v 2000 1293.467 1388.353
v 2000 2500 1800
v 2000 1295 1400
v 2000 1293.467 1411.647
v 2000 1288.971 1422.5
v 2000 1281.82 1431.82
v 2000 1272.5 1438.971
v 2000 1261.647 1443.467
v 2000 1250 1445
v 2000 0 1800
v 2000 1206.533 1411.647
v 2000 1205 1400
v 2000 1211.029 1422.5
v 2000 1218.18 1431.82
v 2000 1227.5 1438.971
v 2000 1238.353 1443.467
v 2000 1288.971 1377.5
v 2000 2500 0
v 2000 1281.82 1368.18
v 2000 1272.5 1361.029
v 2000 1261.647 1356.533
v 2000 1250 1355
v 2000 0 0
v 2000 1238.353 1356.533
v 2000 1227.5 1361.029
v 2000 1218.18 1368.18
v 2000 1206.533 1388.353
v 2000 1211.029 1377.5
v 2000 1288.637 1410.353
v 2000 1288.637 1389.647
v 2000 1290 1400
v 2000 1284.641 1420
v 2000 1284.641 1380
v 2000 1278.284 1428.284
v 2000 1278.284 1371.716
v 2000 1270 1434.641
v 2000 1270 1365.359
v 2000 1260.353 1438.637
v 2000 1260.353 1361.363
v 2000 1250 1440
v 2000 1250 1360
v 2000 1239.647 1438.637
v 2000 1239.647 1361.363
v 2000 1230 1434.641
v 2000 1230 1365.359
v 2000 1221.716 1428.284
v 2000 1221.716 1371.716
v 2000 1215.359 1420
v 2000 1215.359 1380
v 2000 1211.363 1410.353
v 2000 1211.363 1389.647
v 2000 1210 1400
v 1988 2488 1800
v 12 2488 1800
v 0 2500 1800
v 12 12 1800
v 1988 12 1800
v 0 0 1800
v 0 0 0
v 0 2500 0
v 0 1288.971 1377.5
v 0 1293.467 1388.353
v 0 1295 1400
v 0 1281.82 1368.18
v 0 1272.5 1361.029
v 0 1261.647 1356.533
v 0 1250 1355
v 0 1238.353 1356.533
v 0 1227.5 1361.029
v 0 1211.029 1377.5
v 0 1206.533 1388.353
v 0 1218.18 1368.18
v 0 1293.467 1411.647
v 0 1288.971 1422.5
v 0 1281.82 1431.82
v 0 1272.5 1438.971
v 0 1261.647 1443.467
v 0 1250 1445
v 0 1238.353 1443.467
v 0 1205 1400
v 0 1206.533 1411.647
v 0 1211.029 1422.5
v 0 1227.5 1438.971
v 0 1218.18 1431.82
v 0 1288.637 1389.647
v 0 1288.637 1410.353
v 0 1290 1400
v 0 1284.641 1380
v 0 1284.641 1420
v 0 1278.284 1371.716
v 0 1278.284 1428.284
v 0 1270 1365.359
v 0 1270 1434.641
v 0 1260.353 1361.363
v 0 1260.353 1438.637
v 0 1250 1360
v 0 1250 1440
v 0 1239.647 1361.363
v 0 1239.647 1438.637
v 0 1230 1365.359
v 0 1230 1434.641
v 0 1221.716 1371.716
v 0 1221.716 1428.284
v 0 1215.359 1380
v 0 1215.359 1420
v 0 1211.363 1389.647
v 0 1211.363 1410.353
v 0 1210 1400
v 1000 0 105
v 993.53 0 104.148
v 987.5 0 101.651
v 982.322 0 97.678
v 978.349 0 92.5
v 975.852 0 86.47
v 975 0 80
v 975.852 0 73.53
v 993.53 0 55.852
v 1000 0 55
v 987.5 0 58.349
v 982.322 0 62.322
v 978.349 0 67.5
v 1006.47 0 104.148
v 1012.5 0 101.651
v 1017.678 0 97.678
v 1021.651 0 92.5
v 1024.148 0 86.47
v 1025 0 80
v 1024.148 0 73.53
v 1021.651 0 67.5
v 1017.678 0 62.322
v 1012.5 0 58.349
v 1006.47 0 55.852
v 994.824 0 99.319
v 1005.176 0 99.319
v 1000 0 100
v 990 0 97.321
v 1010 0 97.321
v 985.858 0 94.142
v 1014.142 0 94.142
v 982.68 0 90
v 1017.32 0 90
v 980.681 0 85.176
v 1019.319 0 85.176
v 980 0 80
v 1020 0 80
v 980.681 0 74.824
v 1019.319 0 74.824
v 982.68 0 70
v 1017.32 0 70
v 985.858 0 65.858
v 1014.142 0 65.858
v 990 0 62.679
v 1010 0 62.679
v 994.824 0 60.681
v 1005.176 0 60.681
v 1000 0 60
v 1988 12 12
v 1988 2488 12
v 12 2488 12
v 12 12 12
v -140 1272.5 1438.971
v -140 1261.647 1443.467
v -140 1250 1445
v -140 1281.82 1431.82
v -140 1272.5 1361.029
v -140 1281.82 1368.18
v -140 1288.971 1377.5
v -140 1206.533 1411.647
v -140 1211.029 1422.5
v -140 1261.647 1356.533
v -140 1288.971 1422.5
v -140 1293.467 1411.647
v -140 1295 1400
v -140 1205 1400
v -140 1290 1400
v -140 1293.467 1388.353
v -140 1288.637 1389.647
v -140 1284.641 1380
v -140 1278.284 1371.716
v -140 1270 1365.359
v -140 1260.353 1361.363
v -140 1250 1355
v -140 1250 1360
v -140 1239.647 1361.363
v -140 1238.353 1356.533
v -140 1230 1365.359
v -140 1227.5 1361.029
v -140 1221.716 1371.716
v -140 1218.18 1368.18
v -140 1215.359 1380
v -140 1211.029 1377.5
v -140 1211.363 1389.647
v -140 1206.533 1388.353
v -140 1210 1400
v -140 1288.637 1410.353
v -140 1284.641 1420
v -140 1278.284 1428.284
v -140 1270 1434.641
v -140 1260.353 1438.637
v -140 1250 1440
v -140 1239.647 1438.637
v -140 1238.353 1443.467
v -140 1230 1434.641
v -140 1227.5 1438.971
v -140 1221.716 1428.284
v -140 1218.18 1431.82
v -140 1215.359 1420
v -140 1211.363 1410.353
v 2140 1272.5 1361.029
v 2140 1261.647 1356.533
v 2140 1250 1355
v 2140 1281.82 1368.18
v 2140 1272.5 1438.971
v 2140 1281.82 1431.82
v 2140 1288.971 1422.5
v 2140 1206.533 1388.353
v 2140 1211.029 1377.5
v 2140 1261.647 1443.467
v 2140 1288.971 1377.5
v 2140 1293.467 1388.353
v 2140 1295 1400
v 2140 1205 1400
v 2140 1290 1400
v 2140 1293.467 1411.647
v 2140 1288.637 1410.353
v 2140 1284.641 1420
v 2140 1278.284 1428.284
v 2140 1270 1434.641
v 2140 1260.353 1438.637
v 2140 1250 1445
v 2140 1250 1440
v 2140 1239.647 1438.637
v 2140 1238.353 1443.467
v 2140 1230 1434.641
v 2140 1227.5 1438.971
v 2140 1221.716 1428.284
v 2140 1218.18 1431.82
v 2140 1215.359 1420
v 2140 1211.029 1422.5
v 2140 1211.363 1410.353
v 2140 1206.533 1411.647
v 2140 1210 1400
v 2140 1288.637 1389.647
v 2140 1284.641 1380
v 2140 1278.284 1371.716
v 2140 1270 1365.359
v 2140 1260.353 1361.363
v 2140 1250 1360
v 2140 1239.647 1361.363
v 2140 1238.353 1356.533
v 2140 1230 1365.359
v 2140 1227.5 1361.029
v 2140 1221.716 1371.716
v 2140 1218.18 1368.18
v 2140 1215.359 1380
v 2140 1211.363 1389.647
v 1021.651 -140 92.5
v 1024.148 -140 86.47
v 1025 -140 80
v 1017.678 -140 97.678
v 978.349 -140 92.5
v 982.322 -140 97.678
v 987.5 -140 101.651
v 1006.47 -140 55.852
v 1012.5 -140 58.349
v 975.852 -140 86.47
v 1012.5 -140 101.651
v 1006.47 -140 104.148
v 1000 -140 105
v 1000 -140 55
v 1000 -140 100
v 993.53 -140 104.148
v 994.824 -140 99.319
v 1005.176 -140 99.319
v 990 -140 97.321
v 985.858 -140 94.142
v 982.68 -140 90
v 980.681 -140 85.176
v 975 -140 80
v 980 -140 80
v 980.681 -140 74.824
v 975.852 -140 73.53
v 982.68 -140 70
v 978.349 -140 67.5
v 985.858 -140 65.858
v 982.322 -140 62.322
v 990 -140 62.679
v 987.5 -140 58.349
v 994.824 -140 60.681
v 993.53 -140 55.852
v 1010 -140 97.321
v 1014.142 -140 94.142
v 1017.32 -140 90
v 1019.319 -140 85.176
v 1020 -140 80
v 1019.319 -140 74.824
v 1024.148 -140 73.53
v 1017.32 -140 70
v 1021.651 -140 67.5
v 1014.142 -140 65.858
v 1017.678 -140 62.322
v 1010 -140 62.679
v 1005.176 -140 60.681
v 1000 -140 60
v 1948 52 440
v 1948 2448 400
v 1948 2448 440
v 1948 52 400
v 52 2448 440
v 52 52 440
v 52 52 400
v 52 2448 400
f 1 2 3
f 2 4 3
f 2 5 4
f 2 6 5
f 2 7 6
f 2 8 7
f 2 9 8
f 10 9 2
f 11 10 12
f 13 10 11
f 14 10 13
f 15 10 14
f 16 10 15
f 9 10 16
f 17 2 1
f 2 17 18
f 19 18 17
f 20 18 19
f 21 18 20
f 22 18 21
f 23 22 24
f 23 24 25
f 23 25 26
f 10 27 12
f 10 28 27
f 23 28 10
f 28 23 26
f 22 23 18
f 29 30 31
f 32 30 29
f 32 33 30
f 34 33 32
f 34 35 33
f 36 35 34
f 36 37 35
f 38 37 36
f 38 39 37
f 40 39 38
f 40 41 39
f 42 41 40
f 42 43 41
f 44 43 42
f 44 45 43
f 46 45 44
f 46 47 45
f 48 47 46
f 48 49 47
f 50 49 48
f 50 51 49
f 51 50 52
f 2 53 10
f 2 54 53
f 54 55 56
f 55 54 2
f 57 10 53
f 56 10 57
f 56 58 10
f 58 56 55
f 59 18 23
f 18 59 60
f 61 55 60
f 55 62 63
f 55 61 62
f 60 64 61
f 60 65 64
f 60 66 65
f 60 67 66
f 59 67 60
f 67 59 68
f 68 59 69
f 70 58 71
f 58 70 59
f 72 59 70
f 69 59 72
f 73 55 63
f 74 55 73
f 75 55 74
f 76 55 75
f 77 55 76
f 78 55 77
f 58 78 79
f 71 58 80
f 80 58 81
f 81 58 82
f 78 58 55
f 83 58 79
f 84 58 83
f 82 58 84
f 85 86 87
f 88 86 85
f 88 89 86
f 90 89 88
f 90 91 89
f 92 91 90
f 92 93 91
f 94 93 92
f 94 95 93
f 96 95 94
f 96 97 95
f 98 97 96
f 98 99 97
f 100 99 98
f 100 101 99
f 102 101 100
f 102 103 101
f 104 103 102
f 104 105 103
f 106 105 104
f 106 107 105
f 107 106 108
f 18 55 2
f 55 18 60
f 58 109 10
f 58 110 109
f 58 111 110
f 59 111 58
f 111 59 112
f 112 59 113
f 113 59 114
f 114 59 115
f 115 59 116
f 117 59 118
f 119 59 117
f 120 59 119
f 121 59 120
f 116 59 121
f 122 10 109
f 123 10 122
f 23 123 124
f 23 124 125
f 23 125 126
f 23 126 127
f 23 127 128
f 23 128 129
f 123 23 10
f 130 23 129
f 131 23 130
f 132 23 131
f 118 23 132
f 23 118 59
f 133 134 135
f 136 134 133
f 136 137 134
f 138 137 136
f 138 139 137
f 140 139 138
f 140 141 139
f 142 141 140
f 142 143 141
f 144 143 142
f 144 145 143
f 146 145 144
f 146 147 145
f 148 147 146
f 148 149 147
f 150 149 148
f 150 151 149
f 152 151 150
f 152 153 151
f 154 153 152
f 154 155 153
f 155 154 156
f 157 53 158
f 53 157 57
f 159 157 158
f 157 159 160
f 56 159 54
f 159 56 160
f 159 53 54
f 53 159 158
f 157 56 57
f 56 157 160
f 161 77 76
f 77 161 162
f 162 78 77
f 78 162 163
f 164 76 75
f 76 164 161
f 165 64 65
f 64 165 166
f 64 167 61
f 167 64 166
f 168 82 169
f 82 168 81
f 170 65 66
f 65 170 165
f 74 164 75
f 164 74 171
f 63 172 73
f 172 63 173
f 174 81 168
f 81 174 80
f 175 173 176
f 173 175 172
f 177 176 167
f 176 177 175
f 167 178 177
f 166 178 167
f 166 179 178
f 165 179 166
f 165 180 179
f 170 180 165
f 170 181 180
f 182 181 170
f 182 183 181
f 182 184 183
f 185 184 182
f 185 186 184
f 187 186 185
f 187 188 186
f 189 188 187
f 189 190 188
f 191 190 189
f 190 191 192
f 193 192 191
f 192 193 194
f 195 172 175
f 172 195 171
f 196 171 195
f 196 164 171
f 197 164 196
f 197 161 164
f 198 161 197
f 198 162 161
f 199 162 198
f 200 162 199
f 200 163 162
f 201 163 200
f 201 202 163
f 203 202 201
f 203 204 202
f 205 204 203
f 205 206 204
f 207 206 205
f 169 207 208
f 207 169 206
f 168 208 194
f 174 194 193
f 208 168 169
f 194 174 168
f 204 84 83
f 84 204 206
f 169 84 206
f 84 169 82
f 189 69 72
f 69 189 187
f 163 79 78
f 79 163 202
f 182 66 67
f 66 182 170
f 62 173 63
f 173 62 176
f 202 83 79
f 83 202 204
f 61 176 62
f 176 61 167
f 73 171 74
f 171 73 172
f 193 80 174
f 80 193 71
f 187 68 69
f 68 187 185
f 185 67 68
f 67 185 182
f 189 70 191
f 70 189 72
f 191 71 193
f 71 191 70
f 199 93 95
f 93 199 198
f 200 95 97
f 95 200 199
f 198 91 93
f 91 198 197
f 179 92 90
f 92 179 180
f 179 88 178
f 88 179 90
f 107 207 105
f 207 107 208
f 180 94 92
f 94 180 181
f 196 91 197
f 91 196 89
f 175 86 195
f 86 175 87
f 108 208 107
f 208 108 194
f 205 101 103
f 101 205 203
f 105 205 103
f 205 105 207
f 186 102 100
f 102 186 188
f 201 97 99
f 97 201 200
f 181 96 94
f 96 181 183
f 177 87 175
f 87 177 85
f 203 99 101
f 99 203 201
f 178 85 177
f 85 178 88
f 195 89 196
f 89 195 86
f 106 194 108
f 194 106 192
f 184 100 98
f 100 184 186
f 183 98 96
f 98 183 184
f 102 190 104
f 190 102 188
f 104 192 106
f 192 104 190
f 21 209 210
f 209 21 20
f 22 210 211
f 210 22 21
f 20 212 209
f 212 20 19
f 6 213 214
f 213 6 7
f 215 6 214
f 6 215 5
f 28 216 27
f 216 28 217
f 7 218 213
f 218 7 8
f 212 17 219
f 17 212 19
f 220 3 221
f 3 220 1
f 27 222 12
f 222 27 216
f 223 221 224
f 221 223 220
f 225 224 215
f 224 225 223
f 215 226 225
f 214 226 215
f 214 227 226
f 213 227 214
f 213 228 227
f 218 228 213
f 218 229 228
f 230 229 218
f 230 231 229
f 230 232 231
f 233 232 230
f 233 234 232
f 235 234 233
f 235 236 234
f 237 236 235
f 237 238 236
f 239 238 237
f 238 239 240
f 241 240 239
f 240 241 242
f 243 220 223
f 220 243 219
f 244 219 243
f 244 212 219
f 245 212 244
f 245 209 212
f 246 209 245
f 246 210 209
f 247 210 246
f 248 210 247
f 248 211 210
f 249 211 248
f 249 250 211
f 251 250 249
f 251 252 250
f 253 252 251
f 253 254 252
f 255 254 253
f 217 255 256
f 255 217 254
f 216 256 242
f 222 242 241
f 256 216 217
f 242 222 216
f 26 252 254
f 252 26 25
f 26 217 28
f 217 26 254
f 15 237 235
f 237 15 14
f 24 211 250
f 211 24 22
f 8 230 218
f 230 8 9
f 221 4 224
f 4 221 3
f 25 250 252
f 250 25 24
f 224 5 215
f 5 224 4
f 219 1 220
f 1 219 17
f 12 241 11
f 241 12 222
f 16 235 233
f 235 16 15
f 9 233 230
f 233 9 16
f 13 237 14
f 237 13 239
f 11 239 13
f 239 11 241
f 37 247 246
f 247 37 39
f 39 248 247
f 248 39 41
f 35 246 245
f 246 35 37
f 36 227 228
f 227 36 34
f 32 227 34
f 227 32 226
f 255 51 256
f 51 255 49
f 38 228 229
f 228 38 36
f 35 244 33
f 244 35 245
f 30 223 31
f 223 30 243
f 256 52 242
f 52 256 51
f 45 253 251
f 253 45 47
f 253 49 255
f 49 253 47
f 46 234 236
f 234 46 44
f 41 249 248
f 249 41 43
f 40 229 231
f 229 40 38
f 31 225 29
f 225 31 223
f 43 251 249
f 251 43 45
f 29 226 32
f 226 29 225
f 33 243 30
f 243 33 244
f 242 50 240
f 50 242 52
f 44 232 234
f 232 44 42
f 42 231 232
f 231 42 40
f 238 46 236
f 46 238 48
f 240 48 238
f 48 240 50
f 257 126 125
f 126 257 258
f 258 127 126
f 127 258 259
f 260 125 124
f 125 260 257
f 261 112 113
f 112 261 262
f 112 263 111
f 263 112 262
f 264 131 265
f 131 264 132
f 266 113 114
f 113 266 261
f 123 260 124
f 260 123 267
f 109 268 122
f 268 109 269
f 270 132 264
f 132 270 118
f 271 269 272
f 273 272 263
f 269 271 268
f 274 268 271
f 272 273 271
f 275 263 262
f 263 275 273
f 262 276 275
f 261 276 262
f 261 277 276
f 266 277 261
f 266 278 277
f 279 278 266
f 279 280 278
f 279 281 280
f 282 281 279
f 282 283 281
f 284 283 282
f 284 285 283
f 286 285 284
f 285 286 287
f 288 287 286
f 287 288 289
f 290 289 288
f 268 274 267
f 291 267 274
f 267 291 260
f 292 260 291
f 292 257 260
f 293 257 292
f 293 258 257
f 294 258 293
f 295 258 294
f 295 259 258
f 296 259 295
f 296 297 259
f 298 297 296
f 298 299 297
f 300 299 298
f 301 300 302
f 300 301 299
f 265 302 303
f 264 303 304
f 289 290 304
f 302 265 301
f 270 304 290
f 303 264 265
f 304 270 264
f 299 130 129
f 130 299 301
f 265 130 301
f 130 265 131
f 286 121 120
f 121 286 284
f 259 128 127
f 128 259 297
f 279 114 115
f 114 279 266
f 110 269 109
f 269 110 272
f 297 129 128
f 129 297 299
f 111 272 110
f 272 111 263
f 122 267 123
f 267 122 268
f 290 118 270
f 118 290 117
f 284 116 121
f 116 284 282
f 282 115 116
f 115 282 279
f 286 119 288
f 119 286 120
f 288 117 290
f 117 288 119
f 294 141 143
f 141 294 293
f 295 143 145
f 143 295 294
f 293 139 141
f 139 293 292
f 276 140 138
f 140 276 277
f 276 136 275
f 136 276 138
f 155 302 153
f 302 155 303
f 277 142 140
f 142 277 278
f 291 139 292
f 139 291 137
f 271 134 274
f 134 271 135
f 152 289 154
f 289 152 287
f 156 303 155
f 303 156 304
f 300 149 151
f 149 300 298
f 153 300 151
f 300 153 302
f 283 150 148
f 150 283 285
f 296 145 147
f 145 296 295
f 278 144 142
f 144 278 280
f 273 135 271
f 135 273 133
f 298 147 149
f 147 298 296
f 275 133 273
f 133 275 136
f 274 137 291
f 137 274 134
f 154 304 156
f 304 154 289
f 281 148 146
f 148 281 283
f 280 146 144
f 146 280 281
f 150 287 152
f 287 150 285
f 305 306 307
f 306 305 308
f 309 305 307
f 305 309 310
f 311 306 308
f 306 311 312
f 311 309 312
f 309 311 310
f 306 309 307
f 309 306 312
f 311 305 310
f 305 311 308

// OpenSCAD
// file: ../params.scad
// Shared millimetre parameters. Keep in lockstep with freecad/params.py.
// Module scale: 150 kg/day wet train. Walls are CPVC sheet, not metal.

$fn = 36;

WALL        = 12;     // CPVC sheet thickness
FLOOR       = 16;     // floor plate (trough sits on this)

// LEACH CSTR 1 — inside liquor box
CSTR_L      = 2000;
CSTR_W      = 1200;
CSTR_H      = 1400;   // liquid + freeboard
FREEBOARD   = 200;

// CSTR 2 weir (same vessel, +X wall)
WEIR_W      = 450;
WEIR_CREST  = CSTR_H - FREEBOARD;   // from inner floor
WEIR_SLOT_H = 80;
WEIR_LIP    = 120;    // external spout projection

// CSTR 3 floor auger — injection-molded PVC / FG
AUGER_D     = 140;    // flight OD
AUGER_SHAFT = 40;
AUGER_PITCH = 110;
AUGER_TROUGH_W = 180;
AUGER_TROUGH_H = 110;
AUGER_OFFSET_Y = 280; // trough centreline from inner -Y wall
AUGER_INCLINE  = 28;  // deg, lifts out of liquor toward +X

// mixer / nozzles (lid)
MIXER_D     = 50;
GAS_D       = 80;     // acid-gas takeoff
DROP_X      = 80;     // inner-X of shred drop slot
DROP_L      = 400;
DROP_W      = 250;
DROP_COAM   = 80;     // raised coaming around the slot

// LEACHATE PUMP / coarse strainer — −X wall, opposite the weir
PUMP_D      = 80;     // DN80
PUMP_Z      = 450;    // centreline above inner floor (submerged)
PUMP_Y      = 900;    // centreline from inner −Y (away from auger)
STRAINER_L  = 180;
STRAINER_W  = 140;
STRAINER_H  = 160;

// mezzanine feed train
MEZZ_H      = 2200;   // platform top above tank outer floor
MEZZ_L      = 1600;   // platform length in −X
MEZZ_THK    = 12;
HOPPER_L    = 700;
HOPPER_W    = 600;
HOPPER_H    = 800;
SHRED_L     = 500;
SHRED_W     = 500;
SHRED_H     = 450;
CONV_W      = 240;
CONV_H      = 120;
CONV_PLATE  = 6;      // trough plate
CONV_FLANGE = 40;
CONV_SPRING_D = 50;
CONV_SPRING_H = 80;
CONV_BOLT   = 10;     // M10 clearance
CONV_LEN    = 1800;   // default standalone length; plant instance is computed
DUST_D      = 150;    // dust-hood outlet to DUST header
AUGER_LIFT_L = 700;

// dewater belts + split (Phase A 4–6)
FDEW_L      = 1800;
FDEW_W      = 450;
FDEW_H      = 80;
FDEW_RISE   = 120;    // solids end higher so liquor runs back to weir
SDEW_L      = 1400;
SDEW_W      = 220;
SDEW_H      = 80;
SPLIT_L     = 600;
SPLIT_W     = 500;
SPLIT_H     = 400;
STUB_L      = 400;
STUB_W      = 300;
STUB_H      = 250;

// EW funnel cell
EW_L        = 600;    // along aisle (overflow direction)
EW_W        = 420;    // anode-cathode depth
EW_H        = 650;    // rectangular body
EW_FUNNEL_H = 220;
EW_VALVE_D  = 50;
EW_VALVE_L  = 60;
EW_MEM_T    = 4;      // CEM
EW_SLOT     = 10;     // membrane cassette slot
EW_PITCH    = 750;    // aisle spacing, centre to centre
AISLE_X0    = 200;
AISLE_Y     = -(EW_W + 2*WALL) - 400;
AISLE_Z     = 400;
BUND_H      = 150;
BUND_PAD    = 250;
SUMP_L      = 400;
SUMP_W      = 400;
SUMP_H      = 300;
VDF_D       = 700;
VDF_L       = 900;
PAIL_W      = 180;
HDR_D       = 80;
HDR_Z       = 1400;
PYRO_D      = 320;
PYRO_L      = 2800;

// Campus envelopes — lockstep with freecad/params.py
FARM_X=12000; FARM_Y=8000; FARM_L=12000; FARM_W=8000; FARM_H=4500;
FAB_X=12000;  FAB_Y=-6000; FAB_L=8000;   FAB_W=6000;  FAB_H=4000;
HAB_X=-8000;  HAB_Y=8000;  HAB_L=8000;   HAB_W=6000;  HAB_H=3200;
CRYO_X=-6000; CRYO_Y=-4000; CRYO_L=4000; CRYO_W=3000; CRYO_H=3000;
MFG_X=2000;   MFG_Y=9000;  MFG_L=6000;   MFG_W=4000;  MFG_H=3500;

LIFE_Z_GREY=900; LIFE_Z_UPW=1100; LIFE_Z_ETCH=1300;
LIFE_Z_O2=2800; LIFE_Z_N2=3000; LIFE_Z_CO2=3200;
LIFE_D_GREY=50; LIFE_D_UPW=40; LIFE_D_ETCH=32;
LIFE_D_GAS=25; LIFE_D_CO2=40;
// main file
// BIOFILTER — media bed, B1–B3.
include <../params.scad>;
$fn = 24;
L=2000; W=2500; H=1800; T=12;

module stub(d, l=140) {
    difference() {
        cylinder(h=l, d=d+10);
        translate([0,0,-1]) cylinder(h=l+2, d=d);
    }
}

module mfg_biofilter() {
    difference() {
        cube([L, W, H]);
        translate([T, T, T]) cube([L-2*T, W-2*T, H]);
    }
    translate([0, W/2, 1400]) rotate([0,-90,0]) stub(80); // B1
    translate([L, W/2, 1400]) rotate([0,90,0]) stub(80);  // B2
    translate([L/2, 0, 80]) rotate([90,0,0]) stub(40);    // B3
    translate([T+40, T+40, 400]) cube([L-2*T-80, W-2*T-80, 40]); // media floor
}

mfg_biofilter();
